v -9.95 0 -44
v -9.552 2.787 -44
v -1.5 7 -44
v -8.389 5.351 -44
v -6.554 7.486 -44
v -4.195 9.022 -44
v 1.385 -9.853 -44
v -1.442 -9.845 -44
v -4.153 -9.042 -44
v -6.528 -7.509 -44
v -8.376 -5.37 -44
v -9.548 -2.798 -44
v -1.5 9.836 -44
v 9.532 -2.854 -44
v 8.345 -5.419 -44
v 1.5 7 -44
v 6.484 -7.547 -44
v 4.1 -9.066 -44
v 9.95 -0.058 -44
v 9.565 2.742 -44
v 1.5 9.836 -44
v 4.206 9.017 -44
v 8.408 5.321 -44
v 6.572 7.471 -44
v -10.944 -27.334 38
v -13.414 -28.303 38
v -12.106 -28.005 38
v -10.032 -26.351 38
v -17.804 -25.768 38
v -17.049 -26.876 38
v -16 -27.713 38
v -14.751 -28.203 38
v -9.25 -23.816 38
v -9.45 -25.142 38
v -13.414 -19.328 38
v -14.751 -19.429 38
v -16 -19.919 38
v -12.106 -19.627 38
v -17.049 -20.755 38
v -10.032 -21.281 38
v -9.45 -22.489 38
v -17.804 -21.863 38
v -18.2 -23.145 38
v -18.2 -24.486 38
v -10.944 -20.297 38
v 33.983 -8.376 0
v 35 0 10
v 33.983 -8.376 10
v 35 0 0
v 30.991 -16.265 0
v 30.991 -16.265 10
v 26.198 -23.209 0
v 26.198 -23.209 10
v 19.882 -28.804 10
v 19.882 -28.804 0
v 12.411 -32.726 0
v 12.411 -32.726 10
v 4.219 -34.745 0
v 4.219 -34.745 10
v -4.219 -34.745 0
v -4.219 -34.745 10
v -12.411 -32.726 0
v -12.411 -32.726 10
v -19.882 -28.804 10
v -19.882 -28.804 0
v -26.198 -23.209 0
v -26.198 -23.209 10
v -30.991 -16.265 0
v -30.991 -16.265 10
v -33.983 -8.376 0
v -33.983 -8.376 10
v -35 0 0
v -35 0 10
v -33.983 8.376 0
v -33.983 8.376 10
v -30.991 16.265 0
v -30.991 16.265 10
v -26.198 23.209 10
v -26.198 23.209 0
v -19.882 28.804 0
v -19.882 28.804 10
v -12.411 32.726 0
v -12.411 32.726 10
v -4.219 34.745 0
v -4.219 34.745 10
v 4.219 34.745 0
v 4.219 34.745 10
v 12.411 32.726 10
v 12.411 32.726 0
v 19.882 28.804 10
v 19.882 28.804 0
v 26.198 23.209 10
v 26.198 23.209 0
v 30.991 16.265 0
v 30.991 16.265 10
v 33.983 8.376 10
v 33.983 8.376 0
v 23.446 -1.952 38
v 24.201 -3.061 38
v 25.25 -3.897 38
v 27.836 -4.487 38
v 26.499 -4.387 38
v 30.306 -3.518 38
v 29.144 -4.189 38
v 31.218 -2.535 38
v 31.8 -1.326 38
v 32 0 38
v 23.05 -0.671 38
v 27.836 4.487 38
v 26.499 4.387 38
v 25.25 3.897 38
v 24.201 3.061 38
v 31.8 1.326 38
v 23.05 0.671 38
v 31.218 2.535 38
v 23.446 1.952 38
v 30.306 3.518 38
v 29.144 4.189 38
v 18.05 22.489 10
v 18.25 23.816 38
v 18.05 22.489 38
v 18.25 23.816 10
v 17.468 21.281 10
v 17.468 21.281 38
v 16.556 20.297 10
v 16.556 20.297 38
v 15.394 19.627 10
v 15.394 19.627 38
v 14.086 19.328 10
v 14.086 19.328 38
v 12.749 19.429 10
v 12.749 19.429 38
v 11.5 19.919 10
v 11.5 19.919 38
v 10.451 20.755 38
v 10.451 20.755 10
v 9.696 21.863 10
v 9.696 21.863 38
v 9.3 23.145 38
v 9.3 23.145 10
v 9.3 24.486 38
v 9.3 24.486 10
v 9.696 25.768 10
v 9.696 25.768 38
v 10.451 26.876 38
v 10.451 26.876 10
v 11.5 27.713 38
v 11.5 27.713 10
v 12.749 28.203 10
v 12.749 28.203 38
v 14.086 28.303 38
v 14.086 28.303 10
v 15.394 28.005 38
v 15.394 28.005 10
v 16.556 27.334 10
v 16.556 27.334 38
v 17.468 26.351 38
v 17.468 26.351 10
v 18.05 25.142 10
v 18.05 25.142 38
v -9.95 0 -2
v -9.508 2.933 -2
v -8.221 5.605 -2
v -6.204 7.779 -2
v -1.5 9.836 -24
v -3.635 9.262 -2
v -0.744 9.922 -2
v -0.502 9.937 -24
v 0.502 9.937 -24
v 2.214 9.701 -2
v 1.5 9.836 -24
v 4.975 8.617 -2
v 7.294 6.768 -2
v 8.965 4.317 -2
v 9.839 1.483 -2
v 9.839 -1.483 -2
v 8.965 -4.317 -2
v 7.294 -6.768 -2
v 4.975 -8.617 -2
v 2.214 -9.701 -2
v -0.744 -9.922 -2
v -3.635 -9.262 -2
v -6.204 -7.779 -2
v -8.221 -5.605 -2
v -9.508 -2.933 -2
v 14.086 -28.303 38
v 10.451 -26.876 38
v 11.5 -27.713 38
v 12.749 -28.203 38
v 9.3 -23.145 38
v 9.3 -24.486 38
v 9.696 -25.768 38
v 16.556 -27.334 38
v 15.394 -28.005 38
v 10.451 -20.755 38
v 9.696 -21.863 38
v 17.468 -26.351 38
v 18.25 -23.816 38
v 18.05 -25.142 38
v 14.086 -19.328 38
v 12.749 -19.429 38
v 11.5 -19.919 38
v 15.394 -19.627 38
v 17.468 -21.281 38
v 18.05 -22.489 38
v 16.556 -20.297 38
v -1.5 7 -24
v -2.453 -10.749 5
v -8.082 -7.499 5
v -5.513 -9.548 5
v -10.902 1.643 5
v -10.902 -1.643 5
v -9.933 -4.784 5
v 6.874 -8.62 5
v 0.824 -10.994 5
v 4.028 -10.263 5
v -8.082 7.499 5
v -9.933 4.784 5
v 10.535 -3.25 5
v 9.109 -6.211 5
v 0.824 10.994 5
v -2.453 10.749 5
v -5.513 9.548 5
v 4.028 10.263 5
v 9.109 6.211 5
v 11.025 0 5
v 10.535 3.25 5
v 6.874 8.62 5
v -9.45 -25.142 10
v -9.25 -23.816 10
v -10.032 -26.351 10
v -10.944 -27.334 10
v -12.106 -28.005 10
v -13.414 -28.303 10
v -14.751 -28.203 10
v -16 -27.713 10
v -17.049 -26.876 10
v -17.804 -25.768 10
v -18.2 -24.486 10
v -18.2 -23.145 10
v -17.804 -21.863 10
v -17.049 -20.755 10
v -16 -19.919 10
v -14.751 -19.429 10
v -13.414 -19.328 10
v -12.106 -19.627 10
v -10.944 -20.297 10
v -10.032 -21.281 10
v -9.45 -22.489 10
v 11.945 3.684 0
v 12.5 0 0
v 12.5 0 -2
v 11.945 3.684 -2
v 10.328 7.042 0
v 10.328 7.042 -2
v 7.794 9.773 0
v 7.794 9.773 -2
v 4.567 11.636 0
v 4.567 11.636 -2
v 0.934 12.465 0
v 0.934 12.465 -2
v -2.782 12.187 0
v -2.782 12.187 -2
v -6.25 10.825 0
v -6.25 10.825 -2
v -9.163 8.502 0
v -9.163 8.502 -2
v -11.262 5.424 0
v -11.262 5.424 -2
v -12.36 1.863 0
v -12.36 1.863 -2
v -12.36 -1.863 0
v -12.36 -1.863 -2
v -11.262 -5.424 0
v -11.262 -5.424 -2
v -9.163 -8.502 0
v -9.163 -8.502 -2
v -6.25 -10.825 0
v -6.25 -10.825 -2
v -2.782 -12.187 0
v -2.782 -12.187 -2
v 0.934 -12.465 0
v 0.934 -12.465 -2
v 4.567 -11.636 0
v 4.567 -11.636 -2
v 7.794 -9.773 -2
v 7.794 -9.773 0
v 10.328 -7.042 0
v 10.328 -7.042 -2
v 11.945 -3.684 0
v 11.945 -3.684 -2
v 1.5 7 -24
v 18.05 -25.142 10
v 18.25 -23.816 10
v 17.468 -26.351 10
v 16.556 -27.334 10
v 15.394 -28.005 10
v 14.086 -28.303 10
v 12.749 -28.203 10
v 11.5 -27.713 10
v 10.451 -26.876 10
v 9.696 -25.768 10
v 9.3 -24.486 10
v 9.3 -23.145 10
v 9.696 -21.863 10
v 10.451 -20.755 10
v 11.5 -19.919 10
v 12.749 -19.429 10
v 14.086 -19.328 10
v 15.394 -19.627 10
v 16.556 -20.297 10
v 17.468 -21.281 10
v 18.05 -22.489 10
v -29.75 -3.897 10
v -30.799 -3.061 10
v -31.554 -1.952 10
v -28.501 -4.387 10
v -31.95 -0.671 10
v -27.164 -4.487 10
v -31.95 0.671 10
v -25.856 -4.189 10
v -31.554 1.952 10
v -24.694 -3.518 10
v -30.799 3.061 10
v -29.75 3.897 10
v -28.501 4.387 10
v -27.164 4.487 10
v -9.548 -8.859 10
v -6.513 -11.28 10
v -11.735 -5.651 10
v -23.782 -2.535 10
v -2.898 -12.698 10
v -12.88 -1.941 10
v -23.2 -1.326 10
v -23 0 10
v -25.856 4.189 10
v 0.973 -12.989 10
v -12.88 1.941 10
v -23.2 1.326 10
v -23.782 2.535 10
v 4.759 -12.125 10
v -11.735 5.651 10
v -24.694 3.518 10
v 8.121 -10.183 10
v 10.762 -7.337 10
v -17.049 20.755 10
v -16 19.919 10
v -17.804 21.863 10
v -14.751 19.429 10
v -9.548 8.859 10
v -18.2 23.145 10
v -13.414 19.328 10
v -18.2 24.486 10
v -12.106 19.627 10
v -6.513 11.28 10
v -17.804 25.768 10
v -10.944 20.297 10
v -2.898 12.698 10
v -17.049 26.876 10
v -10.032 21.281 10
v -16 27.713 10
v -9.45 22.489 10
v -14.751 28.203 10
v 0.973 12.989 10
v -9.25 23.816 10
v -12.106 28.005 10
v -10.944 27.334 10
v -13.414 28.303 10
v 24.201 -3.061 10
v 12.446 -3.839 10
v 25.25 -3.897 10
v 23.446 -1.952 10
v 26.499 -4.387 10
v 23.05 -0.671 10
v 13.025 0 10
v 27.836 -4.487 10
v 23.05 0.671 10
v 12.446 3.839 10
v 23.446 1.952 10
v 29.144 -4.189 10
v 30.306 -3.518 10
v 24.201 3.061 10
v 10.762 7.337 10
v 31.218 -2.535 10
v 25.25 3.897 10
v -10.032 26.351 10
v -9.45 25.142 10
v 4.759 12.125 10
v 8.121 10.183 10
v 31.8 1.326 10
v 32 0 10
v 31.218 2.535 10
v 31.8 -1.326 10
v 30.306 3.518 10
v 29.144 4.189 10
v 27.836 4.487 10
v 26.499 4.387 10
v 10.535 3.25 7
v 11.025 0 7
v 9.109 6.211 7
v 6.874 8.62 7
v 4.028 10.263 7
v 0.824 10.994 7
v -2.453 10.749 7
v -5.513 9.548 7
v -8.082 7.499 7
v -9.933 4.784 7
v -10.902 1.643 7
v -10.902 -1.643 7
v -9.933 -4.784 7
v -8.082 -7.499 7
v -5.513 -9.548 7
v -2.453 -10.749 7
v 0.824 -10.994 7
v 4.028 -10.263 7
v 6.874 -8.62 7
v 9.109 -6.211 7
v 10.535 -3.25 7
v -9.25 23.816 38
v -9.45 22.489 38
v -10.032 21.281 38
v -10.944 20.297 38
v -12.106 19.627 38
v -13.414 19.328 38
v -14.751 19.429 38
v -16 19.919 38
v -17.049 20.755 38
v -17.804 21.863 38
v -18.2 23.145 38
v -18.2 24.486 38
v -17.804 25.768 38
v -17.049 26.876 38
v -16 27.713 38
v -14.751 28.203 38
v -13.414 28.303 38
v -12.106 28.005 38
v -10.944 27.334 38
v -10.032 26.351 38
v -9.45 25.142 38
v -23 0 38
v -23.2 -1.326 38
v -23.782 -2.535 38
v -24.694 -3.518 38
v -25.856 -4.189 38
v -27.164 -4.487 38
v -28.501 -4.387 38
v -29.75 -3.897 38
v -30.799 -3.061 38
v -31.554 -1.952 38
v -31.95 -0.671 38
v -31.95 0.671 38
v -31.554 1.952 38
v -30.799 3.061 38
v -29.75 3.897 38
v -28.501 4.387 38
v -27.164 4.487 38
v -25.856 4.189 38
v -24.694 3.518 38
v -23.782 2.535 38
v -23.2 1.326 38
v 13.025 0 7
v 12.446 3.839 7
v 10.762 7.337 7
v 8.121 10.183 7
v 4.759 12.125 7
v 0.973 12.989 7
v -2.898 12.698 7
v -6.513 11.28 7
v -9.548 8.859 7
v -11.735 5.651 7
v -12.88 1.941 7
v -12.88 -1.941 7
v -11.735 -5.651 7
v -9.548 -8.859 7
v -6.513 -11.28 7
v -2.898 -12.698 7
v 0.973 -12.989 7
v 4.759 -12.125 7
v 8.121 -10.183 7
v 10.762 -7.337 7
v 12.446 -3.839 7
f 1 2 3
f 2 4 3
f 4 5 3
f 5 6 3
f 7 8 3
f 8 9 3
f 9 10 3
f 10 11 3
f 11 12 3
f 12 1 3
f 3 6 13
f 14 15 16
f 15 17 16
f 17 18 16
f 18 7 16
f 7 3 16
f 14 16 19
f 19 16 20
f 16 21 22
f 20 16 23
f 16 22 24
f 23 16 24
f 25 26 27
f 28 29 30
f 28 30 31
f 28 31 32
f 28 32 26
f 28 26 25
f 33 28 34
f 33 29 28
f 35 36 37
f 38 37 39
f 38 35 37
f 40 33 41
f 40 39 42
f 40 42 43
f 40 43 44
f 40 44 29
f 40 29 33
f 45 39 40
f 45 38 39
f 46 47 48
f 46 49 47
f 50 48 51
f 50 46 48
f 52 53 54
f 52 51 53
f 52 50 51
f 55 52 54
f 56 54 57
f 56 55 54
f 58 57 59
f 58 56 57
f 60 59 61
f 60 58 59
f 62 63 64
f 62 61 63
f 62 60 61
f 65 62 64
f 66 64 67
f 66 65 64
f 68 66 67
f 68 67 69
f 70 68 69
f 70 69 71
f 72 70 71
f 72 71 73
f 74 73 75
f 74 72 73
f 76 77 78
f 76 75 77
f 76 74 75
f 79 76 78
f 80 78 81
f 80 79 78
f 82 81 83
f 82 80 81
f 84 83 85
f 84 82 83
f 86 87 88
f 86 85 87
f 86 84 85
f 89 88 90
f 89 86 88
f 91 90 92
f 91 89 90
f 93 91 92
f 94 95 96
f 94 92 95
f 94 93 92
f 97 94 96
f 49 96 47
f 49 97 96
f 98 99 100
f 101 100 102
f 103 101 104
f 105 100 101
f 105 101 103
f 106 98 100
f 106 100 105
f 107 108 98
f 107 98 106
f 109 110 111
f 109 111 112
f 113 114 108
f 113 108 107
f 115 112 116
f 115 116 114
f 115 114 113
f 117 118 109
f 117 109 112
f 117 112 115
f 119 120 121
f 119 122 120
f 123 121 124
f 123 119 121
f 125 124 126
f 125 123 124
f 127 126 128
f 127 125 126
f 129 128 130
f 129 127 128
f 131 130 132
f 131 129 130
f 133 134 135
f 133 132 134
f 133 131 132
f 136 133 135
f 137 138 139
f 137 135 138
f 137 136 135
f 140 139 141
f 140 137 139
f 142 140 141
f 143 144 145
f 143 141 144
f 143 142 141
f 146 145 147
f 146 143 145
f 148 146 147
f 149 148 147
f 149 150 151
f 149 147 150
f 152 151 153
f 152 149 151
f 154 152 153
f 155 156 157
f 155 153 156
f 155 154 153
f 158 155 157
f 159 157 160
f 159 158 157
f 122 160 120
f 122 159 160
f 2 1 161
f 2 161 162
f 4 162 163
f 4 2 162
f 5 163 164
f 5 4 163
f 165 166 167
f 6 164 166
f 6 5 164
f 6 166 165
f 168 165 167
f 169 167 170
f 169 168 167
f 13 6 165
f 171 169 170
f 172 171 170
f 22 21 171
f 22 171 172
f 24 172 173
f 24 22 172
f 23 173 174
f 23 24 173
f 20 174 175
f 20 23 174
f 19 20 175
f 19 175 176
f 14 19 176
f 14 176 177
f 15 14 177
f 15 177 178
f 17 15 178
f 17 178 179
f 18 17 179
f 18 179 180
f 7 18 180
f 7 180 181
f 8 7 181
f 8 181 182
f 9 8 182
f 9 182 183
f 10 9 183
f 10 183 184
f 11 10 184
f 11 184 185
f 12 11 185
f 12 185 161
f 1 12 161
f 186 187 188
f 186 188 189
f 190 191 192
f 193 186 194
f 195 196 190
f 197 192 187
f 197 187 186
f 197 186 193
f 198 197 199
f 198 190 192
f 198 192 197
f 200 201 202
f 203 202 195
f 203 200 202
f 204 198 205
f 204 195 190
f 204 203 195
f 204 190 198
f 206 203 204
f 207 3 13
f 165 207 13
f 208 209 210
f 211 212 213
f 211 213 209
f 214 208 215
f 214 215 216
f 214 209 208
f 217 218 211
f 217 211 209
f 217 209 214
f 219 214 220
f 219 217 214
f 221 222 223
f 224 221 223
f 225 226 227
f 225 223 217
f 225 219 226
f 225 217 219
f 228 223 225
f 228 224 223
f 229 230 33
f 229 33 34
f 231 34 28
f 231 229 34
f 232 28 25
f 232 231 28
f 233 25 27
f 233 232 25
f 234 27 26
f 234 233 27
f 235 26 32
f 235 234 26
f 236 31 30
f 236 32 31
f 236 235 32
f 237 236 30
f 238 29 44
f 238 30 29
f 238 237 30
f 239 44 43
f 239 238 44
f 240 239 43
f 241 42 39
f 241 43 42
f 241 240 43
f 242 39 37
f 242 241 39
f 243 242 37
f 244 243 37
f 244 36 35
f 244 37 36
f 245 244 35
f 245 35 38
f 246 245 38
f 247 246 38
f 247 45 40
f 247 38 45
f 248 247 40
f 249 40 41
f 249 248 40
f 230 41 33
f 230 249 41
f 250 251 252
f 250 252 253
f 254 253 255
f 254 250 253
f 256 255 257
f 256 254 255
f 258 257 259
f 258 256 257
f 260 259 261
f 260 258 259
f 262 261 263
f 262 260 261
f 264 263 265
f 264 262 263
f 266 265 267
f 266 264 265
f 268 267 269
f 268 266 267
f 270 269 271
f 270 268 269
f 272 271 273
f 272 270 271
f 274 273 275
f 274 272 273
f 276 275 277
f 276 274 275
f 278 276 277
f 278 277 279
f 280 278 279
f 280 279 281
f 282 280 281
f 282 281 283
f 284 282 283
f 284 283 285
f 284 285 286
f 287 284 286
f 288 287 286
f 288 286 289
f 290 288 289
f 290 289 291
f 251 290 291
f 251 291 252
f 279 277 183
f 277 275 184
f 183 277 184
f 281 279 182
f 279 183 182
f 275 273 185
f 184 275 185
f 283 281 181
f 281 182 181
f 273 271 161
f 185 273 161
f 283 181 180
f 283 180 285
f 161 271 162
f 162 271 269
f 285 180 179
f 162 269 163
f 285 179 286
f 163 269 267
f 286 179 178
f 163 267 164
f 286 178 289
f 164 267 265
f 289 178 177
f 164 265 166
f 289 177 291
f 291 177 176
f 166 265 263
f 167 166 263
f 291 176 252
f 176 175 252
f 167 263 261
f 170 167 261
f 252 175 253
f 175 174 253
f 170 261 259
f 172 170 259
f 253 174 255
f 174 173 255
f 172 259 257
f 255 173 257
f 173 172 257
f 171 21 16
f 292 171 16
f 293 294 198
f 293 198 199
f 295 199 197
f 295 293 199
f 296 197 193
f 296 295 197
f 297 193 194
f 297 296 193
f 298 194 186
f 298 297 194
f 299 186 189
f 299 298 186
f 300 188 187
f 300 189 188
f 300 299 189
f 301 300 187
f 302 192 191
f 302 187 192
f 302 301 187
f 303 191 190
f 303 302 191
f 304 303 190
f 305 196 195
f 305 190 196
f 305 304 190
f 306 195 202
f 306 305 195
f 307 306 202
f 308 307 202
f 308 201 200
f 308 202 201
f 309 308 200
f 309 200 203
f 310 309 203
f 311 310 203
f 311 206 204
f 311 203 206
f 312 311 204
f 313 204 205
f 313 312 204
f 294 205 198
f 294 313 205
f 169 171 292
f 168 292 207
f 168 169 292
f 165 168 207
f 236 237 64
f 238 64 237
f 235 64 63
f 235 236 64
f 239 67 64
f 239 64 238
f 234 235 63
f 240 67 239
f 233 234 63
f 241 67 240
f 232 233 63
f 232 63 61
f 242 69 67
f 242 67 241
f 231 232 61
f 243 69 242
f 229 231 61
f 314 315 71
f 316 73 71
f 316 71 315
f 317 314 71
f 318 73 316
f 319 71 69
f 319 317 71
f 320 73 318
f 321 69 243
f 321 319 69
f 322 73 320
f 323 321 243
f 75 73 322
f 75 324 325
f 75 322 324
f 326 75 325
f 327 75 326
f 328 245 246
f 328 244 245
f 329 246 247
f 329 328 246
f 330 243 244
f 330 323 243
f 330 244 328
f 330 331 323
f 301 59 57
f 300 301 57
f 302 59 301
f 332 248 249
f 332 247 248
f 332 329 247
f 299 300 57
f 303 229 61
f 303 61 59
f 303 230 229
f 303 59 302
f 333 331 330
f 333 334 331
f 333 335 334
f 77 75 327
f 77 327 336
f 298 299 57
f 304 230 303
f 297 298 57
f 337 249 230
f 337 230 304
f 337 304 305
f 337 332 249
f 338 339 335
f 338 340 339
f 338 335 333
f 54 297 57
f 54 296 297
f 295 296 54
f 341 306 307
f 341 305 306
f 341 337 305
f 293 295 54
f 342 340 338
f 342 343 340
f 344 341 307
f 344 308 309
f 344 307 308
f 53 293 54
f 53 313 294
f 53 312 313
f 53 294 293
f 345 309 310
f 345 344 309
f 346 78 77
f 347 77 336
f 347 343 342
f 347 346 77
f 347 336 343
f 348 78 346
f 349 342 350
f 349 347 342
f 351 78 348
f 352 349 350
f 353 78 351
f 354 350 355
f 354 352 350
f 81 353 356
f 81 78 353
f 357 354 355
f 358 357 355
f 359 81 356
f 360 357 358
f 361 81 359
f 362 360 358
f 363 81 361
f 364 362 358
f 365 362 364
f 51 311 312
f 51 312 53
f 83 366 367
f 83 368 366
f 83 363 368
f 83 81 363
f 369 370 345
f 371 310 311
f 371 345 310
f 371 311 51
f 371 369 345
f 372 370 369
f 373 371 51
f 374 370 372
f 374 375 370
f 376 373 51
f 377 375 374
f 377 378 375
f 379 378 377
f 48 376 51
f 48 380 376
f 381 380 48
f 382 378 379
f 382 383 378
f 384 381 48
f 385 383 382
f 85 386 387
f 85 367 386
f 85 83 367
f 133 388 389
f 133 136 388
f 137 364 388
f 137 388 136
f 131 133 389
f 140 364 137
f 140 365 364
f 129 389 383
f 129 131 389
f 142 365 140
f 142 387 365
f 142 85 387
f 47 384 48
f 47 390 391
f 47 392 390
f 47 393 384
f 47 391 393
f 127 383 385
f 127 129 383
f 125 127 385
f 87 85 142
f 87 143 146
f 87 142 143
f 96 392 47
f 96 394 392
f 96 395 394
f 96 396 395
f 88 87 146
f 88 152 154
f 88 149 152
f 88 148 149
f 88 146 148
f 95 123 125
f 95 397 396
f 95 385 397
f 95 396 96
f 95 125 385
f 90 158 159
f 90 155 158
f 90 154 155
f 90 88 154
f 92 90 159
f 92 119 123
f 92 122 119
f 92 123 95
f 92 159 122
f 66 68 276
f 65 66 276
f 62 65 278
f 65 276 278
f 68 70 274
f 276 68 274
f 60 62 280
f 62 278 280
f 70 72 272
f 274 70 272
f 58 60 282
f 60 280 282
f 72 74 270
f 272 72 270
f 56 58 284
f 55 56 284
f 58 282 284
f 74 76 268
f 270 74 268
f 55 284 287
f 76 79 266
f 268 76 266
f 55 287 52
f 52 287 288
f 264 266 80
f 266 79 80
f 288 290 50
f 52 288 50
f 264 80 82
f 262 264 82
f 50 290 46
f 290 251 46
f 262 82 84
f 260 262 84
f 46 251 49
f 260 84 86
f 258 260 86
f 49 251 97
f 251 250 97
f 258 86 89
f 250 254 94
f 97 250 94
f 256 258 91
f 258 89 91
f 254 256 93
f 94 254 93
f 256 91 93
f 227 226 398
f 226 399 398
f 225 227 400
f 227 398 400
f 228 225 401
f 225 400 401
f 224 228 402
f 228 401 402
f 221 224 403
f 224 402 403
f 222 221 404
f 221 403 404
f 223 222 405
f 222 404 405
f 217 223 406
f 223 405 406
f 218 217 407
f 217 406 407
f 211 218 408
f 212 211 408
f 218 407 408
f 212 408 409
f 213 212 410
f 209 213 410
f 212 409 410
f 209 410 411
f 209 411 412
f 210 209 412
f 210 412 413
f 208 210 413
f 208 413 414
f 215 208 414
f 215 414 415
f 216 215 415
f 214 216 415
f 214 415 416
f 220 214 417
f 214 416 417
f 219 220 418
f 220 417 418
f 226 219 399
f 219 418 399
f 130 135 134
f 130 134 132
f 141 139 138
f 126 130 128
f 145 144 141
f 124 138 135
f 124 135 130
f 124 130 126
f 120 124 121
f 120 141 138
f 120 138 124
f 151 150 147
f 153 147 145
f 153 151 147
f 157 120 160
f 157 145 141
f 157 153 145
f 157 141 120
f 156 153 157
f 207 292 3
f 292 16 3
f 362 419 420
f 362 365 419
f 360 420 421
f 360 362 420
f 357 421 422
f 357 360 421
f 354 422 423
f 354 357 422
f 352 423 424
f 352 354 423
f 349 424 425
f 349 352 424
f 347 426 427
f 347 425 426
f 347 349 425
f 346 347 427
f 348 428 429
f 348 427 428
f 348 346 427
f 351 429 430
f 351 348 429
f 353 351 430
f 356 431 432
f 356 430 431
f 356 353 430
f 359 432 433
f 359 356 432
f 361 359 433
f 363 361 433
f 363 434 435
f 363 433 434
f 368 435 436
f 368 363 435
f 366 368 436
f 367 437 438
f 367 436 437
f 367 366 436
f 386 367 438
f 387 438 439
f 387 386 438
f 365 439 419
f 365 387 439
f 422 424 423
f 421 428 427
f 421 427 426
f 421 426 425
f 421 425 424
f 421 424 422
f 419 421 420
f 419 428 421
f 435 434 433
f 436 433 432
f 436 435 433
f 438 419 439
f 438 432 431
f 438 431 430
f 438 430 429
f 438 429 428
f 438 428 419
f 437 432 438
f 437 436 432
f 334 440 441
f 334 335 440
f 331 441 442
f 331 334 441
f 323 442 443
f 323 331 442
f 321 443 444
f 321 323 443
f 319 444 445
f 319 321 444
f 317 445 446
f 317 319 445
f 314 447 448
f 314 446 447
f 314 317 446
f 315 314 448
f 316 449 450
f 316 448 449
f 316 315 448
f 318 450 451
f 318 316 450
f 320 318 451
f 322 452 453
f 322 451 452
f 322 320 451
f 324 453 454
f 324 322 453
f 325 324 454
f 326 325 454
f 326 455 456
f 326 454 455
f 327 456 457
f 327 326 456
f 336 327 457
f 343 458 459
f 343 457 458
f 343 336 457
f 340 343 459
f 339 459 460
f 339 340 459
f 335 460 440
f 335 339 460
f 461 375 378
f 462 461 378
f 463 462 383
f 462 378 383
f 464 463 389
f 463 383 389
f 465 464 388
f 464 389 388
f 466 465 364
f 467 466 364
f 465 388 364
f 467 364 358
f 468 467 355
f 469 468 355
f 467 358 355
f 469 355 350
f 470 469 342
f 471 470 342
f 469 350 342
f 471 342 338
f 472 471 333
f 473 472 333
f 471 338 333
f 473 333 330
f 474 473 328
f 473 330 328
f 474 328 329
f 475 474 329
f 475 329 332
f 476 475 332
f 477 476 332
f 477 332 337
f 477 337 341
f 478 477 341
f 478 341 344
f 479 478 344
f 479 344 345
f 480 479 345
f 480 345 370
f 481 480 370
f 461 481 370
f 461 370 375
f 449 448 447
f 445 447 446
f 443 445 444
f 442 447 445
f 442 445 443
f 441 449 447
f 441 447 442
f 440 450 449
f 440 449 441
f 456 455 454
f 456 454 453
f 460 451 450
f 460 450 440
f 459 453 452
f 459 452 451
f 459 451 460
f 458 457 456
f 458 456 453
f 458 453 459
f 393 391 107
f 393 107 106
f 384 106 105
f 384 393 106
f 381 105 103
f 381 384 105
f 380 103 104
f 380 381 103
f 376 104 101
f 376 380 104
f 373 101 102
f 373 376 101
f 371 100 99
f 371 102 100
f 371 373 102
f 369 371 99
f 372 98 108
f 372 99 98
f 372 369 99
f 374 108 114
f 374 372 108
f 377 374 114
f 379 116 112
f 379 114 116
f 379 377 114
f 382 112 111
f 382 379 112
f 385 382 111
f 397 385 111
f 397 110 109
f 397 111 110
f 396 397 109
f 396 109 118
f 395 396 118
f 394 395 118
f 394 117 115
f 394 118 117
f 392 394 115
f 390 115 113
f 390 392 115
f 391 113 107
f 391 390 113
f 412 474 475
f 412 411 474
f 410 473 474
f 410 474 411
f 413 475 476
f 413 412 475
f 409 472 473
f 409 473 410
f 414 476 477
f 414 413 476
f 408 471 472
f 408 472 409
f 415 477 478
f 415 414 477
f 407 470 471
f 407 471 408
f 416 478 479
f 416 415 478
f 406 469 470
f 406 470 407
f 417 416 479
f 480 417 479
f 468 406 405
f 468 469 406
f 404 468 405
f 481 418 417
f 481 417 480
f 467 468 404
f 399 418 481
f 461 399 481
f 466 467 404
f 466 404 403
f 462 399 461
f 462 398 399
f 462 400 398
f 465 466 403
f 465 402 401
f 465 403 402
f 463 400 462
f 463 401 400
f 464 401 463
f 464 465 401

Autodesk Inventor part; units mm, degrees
ref_plane "YZ Plane" through (0, 0, 0) normal (1, 0, 0) x (0, 1, 0)
ref_plane "XZ Plane" through (0, 0, 0) normal (0, 1, 0) x (-1, 0, 0)
ref_plane "XY Plane" through (0, 0, 0) normal (0, 0, 1) x (1, 0, 0)
sketch "Sketch1" plane through (0, 0, 0) normal (0, 0, 1) x (1, 0, 0)
  circle A0 centre (0, 0) radius 27.5 construction
  circle A1 centre (27.5, 0) radius 4.5
  circle A2 centre (13.75, 23.8157) radius 4.5
  circle A3 centre (-13.75, 23.8157) radius 4.5
  circle A4 centre (-27.5, 0) radius 4.5
  circle A5 centre (-13.75, -23.8157) radius 4.5
  circle A6 centre (13.75, -23.8157) radius 4.5
  circle A7 centre (0, 0) radius 35
  circle A8 centre (0, 0) radius 10
  circle A9 centre (0, 0) radius 12.5
  dimension "d0" = 55
  dimension "d1" = 9
  dimension "d4" = 360
  dimension "d6" = 70
  dimension "d11" = 20
  dimension "d19" = 2.5
extrude "Extrusion1" add sketch "Sketch1" along normal blind 10 contours A7 | A9
extrude "Extrusion2" add sketch "Sketch1" along normal blind 38 contours A1 | A2 | A3 | A4 | A5 | A6
sketch "Sketch3" plane through (0, 0, 10) normal (0, 0, 1) x (1, 0, 0)
  circle A0 centre (0, 0) radius 10
  circle A1 centre (0, 0) radius 13.025
  circle A2 centre (0, 0) radius 11.025
  dimension "d16" = 20
  dimension "d24" = 26.05
  dimension "d27" = 2
extrude "Extrusion4" add sketch "Sketch3" against normal blind 54 contours A0
extrude "Extrusion5" add sketch "Sketch1" against normal blind 2 contours A9
extrude "Extrusion7" cut sketch "Sketch3" against normal blind 5 contours A0 | A2
extrude "Extrusion8" cut sketch "Sketch3" against normal blind 3 contours A1
sketch "Sketch5" plane through (0, 0, -44) normal (0, 0, -1) x (-1, 0, 0)
  circle A0 centre (0, 0) radius 10 projected
  circle A1 centre (0, 0) radius 9.95
  dimension "d30" = 0.05
extrude "Extrusion9" cut sketch "Sketch5" against normal up to surface (42 mm away)
sketch "Sketch6" plane through (0, 0, -44) normal (0, 0, -1) x (-1, 0, 0)
  circle A0 centre (0, 0) radius 9.95 projected
  line L0 (-1.5, 7) -> (1.5, 7)
  line L1 (1.5, 7) -> (1.5, 12)
  line L2 (1.5, 12) -> (-1.5, 12)
  line L3 (-1.5, 12) -> (-1.5, 7)
  dimension "d35" = 1.5
  dimension "d36" = 1.5
  dimension "d38" = 7
extrude "Extrusion10" cut sketch "Sketch6" against normal blind 20 contours L1 L0 L3 A0 | A0 L3 L2 L1 picked at (0.1672, 7.9791)
properties part number "Output Shaft"
